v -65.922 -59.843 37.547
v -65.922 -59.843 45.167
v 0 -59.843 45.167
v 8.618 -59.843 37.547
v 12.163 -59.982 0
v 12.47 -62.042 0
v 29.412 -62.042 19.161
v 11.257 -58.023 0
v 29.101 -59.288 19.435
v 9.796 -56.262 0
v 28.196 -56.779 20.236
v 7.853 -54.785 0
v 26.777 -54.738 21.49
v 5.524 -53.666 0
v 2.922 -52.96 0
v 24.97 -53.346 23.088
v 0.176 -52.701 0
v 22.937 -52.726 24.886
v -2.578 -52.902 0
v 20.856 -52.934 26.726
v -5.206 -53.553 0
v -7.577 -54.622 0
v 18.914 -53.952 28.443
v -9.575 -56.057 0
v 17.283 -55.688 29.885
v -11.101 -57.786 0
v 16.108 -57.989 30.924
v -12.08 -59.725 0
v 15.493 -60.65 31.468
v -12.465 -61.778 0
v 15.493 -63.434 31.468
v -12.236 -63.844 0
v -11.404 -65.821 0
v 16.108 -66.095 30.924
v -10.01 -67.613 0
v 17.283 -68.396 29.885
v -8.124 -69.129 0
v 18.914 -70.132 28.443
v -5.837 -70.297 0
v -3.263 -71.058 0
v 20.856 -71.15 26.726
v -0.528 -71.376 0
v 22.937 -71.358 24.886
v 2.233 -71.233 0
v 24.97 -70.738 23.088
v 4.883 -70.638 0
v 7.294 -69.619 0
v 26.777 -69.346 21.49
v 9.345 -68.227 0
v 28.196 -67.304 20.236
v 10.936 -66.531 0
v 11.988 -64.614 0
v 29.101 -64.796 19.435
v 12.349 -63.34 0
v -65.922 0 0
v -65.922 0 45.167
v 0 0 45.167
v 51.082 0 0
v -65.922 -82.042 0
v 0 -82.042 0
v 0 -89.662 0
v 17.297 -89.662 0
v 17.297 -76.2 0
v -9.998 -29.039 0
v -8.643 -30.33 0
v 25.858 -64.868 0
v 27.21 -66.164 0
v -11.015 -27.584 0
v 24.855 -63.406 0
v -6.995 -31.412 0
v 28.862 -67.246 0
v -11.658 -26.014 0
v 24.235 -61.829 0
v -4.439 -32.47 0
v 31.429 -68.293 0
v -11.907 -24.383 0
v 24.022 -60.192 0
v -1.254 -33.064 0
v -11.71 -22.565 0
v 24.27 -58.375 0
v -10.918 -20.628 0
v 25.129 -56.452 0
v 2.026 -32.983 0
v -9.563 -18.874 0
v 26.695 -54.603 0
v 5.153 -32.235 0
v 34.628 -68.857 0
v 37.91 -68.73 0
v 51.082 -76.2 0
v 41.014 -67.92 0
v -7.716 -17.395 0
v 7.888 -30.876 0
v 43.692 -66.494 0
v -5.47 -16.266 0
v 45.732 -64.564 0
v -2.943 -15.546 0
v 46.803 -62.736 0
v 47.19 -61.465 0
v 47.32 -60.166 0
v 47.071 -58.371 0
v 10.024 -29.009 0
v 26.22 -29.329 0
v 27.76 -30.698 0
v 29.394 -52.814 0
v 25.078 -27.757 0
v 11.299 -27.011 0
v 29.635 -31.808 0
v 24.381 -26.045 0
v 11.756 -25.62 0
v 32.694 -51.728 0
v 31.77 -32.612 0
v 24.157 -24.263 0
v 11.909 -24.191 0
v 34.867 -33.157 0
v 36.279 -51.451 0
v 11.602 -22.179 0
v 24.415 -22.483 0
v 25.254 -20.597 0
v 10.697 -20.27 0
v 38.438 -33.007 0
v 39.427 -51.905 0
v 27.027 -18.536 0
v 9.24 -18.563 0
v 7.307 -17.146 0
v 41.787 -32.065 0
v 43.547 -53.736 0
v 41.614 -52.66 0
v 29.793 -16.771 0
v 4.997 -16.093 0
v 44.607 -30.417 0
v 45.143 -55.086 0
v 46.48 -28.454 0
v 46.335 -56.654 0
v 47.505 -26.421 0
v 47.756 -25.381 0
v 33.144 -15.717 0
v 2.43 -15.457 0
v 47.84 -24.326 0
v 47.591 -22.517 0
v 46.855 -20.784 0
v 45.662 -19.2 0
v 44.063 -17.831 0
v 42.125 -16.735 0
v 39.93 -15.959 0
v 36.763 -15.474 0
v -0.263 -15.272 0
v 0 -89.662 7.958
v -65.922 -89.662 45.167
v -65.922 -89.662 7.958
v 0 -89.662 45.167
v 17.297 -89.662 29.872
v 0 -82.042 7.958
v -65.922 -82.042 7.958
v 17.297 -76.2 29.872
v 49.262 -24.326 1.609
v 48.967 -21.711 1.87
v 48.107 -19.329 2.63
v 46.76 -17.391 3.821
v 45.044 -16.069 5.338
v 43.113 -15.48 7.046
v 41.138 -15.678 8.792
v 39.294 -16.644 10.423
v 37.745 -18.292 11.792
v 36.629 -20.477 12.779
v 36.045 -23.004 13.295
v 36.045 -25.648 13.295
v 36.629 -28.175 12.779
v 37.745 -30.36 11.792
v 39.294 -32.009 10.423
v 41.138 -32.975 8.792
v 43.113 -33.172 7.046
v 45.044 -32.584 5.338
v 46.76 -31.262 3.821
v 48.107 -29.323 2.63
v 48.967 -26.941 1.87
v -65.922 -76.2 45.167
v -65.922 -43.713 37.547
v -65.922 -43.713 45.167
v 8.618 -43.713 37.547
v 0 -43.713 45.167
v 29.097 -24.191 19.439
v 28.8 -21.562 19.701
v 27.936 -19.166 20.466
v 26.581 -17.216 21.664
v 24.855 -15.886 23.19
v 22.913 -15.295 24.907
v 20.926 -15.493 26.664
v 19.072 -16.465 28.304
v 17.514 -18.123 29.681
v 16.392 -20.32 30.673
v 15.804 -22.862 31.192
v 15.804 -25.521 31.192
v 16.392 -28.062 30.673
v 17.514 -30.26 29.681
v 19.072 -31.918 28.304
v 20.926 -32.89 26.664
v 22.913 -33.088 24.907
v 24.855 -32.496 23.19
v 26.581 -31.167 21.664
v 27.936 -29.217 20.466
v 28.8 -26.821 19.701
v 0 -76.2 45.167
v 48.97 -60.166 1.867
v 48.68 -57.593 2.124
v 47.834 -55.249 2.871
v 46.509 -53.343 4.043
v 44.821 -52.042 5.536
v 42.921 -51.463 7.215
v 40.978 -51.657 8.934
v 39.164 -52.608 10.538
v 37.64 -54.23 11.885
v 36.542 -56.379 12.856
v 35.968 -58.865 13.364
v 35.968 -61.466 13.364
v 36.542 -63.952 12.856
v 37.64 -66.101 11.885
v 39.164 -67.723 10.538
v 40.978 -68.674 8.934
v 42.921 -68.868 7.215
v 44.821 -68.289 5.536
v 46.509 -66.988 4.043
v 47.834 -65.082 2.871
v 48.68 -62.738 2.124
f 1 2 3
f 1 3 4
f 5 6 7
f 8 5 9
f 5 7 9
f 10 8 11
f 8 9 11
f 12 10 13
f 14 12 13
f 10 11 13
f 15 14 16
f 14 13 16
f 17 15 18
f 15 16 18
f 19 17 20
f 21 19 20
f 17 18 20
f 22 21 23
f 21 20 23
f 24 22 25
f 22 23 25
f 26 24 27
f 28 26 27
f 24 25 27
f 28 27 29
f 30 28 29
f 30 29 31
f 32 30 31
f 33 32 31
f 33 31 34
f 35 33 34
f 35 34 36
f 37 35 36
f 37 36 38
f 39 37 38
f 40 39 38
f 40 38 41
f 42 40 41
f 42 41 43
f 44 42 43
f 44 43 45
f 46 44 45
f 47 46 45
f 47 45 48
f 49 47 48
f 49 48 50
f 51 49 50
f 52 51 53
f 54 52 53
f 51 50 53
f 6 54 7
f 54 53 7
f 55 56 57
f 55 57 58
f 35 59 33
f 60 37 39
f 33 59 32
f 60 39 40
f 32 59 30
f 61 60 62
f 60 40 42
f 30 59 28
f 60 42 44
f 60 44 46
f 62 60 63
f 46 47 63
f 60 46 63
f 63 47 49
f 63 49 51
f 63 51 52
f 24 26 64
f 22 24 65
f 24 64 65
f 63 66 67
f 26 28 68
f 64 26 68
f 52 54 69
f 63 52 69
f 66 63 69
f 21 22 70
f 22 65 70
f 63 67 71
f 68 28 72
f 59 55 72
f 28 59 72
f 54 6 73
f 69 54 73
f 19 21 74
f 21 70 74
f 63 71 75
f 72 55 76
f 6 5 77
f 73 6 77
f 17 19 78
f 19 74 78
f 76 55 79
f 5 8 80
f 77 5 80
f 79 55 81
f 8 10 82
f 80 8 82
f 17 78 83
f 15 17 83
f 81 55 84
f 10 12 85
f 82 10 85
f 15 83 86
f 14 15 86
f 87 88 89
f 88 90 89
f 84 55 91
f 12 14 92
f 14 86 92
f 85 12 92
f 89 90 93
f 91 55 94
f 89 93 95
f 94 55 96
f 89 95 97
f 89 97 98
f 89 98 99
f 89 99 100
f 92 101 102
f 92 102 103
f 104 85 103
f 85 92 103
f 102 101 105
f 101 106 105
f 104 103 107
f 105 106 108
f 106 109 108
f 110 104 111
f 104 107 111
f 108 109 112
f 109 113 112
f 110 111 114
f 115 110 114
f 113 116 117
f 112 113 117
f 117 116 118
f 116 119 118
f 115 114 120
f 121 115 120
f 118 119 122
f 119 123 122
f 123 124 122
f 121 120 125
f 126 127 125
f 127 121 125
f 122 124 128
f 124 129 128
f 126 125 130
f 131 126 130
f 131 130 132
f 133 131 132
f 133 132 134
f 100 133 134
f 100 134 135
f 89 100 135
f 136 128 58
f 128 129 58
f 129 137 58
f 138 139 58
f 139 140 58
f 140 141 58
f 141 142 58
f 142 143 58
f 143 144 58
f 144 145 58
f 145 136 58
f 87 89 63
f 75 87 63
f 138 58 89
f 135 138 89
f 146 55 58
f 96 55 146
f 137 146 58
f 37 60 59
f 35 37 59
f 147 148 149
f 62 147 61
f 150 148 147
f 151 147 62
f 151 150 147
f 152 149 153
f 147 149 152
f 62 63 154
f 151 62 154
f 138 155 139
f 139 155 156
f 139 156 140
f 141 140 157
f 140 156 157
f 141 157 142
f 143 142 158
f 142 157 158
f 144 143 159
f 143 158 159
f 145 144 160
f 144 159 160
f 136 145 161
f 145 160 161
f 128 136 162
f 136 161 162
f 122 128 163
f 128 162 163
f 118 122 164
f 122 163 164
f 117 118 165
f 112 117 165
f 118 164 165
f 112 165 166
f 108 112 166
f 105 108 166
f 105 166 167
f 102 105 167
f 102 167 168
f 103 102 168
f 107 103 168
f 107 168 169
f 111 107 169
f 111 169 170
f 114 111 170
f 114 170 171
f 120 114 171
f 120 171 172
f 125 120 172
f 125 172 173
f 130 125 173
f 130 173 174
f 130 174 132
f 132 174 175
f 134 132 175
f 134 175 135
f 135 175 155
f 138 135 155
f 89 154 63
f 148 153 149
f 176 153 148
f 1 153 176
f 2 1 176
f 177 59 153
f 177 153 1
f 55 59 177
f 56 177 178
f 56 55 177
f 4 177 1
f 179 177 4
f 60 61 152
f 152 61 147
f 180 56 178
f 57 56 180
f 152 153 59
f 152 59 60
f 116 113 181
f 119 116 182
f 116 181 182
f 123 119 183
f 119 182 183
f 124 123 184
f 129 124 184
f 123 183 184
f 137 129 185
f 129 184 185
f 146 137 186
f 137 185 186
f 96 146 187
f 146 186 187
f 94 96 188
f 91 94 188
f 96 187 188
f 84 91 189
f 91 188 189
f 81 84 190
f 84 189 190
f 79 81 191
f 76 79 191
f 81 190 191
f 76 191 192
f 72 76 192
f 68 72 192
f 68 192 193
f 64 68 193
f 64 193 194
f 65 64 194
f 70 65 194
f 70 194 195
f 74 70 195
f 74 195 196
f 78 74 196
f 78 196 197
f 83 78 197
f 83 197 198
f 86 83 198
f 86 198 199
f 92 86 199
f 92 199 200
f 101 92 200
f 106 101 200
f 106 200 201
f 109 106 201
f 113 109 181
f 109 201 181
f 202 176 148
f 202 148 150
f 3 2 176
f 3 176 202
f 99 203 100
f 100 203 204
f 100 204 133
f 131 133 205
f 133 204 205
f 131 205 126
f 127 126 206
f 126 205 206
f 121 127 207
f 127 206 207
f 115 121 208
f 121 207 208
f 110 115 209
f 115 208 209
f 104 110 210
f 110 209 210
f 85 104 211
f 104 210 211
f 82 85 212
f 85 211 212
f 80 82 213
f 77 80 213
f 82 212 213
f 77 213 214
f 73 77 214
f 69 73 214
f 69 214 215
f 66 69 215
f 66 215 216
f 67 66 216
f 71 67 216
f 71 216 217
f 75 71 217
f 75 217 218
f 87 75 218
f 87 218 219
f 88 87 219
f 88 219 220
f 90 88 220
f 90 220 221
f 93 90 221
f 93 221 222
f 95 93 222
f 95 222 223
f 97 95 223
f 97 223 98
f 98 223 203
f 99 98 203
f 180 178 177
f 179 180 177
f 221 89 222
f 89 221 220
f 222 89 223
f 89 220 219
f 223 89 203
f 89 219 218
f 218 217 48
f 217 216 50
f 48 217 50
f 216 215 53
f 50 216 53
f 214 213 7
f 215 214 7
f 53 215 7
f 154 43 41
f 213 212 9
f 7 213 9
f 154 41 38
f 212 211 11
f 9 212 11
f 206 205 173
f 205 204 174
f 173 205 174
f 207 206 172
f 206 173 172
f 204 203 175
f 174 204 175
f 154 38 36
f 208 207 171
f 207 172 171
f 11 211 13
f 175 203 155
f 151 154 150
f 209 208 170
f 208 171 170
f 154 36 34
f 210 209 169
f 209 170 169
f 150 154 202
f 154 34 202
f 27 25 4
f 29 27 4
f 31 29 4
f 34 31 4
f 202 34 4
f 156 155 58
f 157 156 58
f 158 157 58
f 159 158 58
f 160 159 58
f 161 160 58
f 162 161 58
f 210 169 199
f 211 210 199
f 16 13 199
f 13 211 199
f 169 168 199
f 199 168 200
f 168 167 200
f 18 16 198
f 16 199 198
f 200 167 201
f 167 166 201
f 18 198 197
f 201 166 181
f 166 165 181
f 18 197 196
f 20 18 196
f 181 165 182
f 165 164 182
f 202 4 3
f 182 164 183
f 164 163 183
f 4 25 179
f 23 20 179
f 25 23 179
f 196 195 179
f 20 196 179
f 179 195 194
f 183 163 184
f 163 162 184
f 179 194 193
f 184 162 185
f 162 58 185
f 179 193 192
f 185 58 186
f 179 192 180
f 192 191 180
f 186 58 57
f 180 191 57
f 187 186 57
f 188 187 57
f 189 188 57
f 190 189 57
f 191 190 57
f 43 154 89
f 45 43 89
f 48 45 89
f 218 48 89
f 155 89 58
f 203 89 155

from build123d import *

# Parameters (mm, degrees)
F0_W      = 65.9222155809
F0_H      = 45.1669357717
F1_DEPTH  = 76.2
F2_W      = 65.9222155809
F2_H      = 16.1303170025
F3_DEPTH  = 7.62
F5_DEPTH  = 13.462
F6_W      = 51.6149867326
F6_H      = 45.1669357717
F7_DEPTH  = 13.462
F8_W      = 65.9222155809
F8_H      = 7.957983762
F9_DEPTH  = 7.62
F10_DEPTH = 25.4
F11_R     = 9.3419450296
F11_R_2   = 8.7268718577
F11_R_3   = 8.921818007
F11_R_4   = 8.8708982801
F12_DEPTH = 88.646


with BuildPart() as f1:
    # F0 (on Front) → F1 (new body)
    with BuildSketch(Plane.XZ):
        with Locations((-32.9611077905, 22.5834678859)):
            Rectangle(F0_W, F0_H)
        Polygon((0, 45.1669357717), (0, 0), (51.0816499591, 0), align=None)
    extrude(amount=F1_DEPTH)

    # F2 (on face) → F3 (cut)
    with BuildSketch(Plane.XY.offset(45.1669357717)):
        with Locations((-32.9611077905, -51.7781917006)):
            Rectangle(F2_W, F2_H)
    extrude(amount=-F3_DEPTH, mode=Mode.SUBTRACT)

    # F4 (on face) → F5 (join)
    with BuildSketch(Plane.XZ.offset(76.2)):
        Polygon((17.2973467296, 0), (17.2973467296, 29.8724386405), (0, 45.1669357717), (-14.3072288483, 45.1669357717), (-14.3072288483, 0), align=None)
    extrude(amount=F5_DEPTH)

    # F6 (on face) → F7 (join)
    with BuildSketch(Plane.XZ.offset(76.2)):
        with Locations((-40.1147222146, 22.5834678859)):
            Rectangle(F6_W, F6_H)
    extrude(amount=F7_DEPTH)

    # F8 (on face) → F9 (cut)
    with BuildSketch(Plane.XZ.offset(89.662)):
        with Locations((-32.9611077905, 3.978991881)):
            Rectangle(F8_W, F8_H)
    extrude(amount=-F9_DEPTH, mode=Mode.SUBTRACT)

    # F10 (cut): a face of the model
    f10_faces = [f1.faces().sort_by_distance(p)[0] for p in [
        (0, -51.7781917006, 41.3569357717),
    ]]
    extrude(f10_faces, amount=-F10_DEPTH, mode=Mode.SUBTRACT)

    # F11 (on face) → F12 (cut)
    with BuildSketch(Plane(origin=(22.4135408595, 0, 25.348645618), x_dir=(0.7491470366, 0, -0.6624037421), z_dir=(0.6624037421, 0, 0.7491470366))):
        with Locations((0, -62.0419606566)):
            Circle(F11_R)
        with Locations((26.7226807773, -60.1655058563)):
            Circle(F11_R_2)
        with Locations((0, -24.1914074868)):
            Circle(F11_R_3)
        with Locations((26.9680060446, -24.3262052536)):
            Circle(F11_R_4)
    extrude(amount=-F12_DEPTH, mode=Mode.SUBTRACT)


solid = f1.part
